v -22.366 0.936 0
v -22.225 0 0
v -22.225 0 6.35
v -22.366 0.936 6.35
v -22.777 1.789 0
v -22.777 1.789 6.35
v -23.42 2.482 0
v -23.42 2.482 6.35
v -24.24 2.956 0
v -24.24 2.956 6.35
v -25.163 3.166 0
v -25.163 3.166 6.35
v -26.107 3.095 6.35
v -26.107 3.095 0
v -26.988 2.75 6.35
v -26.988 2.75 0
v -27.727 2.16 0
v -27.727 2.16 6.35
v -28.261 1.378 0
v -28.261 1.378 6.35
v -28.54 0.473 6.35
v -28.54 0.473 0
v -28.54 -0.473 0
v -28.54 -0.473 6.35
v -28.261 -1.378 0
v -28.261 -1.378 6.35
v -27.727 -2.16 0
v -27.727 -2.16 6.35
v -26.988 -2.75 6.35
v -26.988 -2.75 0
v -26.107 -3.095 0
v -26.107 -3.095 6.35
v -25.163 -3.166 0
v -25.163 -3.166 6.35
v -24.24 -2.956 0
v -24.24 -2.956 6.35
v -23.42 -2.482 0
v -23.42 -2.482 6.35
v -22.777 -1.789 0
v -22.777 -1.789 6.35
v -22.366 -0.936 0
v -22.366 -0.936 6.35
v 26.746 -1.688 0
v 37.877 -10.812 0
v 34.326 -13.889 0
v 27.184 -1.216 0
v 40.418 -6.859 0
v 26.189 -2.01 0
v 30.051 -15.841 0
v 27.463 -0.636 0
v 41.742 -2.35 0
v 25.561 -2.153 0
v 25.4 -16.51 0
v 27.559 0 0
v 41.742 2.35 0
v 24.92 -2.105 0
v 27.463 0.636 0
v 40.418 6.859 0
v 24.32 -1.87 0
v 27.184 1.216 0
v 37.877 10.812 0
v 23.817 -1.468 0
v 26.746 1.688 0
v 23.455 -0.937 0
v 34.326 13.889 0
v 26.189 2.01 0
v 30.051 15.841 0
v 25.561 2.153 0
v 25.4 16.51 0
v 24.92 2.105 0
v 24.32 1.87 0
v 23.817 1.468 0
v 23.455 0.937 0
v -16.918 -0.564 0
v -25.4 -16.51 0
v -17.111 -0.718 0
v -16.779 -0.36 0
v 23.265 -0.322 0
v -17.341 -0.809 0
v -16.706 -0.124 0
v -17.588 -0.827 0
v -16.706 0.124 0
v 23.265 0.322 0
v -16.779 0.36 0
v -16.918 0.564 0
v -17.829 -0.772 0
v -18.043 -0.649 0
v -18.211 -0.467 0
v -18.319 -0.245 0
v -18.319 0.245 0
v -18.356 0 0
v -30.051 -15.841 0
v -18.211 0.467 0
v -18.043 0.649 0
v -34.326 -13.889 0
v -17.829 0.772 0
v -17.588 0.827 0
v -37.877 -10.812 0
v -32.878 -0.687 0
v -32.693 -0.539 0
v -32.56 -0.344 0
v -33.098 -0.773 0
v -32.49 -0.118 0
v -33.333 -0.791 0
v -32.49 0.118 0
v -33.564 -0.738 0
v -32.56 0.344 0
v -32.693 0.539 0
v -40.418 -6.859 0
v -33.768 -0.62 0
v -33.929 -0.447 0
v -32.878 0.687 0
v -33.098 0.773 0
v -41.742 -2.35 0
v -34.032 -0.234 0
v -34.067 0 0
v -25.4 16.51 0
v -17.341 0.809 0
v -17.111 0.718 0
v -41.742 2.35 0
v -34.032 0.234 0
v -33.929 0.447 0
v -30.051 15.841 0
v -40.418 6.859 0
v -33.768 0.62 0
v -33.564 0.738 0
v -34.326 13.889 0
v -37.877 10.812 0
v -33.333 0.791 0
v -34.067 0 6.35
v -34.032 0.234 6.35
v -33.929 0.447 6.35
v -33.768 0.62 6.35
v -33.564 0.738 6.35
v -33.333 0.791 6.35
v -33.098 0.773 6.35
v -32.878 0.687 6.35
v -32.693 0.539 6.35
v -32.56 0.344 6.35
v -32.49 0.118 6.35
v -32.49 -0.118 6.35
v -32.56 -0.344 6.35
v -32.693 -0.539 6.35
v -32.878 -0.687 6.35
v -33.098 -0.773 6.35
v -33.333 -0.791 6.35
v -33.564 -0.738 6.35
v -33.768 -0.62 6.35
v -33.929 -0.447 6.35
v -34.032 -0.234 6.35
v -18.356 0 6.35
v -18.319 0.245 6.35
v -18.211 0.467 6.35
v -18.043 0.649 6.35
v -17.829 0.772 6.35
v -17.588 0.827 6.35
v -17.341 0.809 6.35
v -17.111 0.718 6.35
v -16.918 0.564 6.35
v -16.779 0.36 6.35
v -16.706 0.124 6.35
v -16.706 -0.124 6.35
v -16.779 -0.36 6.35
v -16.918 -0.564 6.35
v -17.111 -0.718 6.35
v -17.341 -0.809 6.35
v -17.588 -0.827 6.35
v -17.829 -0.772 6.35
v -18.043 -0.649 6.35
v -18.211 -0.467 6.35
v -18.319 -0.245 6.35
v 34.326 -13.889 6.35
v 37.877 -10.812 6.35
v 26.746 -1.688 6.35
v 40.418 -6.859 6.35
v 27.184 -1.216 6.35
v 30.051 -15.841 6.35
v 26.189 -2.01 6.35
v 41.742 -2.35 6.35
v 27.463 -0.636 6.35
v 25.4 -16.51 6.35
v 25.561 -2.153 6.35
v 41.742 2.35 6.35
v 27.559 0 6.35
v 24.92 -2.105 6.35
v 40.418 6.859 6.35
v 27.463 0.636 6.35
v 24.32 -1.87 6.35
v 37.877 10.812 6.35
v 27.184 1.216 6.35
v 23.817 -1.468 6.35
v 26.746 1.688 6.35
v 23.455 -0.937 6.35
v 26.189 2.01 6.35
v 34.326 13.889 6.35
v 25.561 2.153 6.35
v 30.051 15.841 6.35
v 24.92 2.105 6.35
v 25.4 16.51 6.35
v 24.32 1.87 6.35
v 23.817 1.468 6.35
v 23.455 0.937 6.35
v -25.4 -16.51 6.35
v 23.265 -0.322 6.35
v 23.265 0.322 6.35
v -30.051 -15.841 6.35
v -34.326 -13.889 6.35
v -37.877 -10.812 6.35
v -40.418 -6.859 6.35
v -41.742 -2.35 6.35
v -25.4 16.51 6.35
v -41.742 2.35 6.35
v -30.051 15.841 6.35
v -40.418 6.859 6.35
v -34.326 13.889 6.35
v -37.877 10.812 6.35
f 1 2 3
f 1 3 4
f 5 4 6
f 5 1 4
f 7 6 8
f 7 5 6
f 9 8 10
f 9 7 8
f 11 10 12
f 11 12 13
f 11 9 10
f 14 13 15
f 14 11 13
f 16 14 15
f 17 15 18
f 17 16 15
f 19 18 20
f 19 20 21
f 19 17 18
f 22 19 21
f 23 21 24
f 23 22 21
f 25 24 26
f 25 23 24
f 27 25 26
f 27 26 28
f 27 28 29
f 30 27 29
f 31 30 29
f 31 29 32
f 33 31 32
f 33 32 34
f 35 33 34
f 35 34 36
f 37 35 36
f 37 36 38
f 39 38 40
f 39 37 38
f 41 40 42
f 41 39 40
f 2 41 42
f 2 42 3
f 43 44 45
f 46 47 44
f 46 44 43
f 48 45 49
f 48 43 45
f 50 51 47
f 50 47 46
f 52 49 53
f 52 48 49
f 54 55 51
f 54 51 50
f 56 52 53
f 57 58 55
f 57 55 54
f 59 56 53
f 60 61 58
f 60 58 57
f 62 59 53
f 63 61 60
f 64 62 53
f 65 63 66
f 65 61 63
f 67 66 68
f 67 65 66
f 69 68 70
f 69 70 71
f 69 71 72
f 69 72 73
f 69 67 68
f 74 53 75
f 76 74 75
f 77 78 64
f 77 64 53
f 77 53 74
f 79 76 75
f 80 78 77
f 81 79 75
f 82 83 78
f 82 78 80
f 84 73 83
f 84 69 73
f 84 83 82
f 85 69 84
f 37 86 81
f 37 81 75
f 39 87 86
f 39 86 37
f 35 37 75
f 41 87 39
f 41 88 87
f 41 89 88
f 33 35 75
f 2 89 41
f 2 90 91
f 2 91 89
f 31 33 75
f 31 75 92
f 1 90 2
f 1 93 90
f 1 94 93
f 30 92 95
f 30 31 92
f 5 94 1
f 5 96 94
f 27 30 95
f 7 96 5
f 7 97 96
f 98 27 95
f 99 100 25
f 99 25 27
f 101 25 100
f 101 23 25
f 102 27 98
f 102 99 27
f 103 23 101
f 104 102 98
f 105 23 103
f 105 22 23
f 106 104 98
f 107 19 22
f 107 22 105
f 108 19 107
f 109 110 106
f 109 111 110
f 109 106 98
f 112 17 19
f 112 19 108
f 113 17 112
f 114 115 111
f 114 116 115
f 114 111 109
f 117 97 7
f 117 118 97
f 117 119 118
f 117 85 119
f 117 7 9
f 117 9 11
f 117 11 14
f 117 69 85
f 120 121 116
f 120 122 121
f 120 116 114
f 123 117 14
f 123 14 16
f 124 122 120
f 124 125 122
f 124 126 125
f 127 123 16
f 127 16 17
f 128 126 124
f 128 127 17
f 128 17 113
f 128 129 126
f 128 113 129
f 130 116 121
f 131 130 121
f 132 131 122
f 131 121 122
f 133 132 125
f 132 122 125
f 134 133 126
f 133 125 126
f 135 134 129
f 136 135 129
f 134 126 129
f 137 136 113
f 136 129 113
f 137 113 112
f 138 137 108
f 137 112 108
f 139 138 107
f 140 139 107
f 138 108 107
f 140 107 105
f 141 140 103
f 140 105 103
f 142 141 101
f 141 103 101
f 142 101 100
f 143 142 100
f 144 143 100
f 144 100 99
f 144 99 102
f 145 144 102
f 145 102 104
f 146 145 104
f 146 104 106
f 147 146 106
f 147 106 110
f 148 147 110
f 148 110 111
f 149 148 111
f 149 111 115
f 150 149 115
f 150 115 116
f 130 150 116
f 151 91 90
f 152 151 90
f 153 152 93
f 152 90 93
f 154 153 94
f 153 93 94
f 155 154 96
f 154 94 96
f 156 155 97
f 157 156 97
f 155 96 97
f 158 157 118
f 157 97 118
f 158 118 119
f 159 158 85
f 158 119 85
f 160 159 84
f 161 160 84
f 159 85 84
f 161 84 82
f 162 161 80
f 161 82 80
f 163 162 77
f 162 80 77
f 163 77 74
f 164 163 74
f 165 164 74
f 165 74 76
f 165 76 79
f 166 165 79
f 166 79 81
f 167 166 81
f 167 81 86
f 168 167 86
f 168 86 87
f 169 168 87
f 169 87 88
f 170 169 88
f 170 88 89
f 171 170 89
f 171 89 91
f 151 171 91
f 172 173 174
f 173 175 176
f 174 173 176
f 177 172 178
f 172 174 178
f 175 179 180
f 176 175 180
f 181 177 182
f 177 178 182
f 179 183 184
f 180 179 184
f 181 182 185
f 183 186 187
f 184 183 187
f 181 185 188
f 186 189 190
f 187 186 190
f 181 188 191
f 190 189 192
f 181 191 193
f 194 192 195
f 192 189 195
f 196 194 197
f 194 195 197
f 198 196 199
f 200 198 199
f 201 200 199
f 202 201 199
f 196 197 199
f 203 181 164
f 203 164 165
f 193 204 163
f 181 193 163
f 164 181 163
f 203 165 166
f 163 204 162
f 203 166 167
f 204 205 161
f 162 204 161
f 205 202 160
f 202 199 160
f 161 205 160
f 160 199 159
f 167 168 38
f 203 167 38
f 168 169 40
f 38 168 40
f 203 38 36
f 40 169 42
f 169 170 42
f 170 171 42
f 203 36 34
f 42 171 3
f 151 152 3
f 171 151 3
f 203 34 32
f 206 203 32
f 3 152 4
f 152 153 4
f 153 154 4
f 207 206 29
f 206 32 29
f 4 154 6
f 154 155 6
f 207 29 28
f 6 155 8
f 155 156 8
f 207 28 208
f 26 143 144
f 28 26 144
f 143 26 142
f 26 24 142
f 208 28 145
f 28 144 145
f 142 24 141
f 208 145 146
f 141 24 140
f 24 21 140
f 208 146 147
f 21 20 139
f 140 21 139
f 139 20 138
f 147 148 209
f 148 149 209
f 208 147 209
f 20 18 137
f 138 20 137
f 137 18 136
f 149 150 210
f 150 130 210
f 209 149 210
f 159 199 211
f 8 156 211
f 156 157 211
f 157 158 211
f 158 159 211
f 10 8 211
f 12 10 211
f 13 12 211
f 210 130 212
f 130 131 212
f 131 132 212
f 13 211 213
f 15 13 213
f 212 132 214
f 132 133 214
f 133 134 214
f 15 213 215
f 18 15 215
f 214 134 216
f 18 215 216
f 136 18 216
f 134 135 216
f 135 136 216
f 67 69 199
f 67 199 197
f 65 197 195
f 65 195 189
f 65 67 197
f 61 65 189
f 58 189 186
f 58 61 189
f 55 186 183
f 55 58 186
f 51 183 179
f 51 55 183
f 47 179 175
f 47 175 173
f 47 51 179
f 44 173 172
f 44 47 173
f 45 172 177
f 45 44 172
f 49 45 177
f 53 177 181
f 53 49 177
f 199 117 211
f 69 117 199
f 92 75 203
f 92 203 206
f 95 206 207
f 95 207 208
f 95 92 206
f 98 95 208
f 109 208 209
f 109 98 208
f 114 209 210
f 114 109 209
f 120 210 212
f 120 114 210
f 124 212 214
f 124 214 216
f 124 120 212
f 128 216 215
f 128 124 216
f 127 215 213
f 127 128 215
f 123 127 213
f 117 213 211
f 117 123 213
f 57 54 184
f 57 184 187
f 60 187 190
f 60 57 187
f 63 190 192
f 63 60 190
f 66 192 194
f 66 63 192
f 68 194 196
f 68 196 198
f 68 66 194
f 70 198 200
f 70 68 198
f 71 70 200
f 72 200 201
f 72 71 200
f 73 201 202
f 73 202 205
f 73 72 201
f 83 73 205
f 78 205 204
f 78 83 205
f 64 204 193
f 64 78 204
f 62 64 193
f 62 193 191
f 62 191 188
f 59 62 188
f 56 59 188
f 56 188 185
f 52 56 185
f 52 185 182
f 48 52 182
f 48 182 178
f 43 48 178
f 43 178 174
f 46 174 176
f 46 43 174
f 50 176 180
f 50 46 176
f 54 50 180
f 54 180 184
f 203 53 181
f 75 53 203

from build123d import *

# Parameters (mm, degrees)
SKETCH1_R           = 2.159
SKETCH1_R_2         = 3.175
BOSS_EXTRUDE1_DEPTH = 6.35
SKETCH2_R           = 7.759647624
SKETCH2_R_2         = 3.81
BOSS_EXTRUDE2_DEPTH = 1.27
SKETCH3_R           = 0.829532788
SKETCH3_R_2         = 0.792789718
CUT_EXTRUDE1_DEPTH  = 17.272


with BuildPart() as part:
    # Sketch1 → Boss-Extrude1 (new body)
    with BuildSketch(Plane.XY):
        with BuildLine():
            Line((-25.4, 16.51), (25.4, 16.51))
            ThreePointArc((25.4, 16.51), (41.91, 0), (25.4, -16.51))
            Line((25.4, -16.51), (-25.4, -16.51))
            ThreePointArc((-25.4, -16.51), (-41.91, 0), (-25.4, 16.51))
        make_face()
        with Locations((25.4, 0)):
            Circle(SKETCH1_R, mode=Mode.SUBTRACT)
        with Locations((-25.4, 0)):
            Circle(SKETCH1_R_2, mode=Mode.SUBTRACT)
    extrude(amount=BOSS_EXTRUDE1_DEPTH)

    # Sketch2 → Boss-Extrude2 (add)
    with BuildSketch(Plane.XY.offset(6.35)):
        with Locations((25.4, 0)):
            Circle(SKETCH2_R)
        with Locations((25.4, 0)):
            Circle(SKETCH2_R_2, mode=Mode.SUBTRACT)
    extrude(amount=-BOSS_EXTRUDE2_DEPTH)

    # Sketch3 → Cut-Extrude1 (cut)
    with BuildSketch(Plane(origin=(0, 0, 0), x_dir=(-1, 0, 0), z_dir=(0, 0, -1))):
        with Locations((17.526, 0)):
            Circle(SKETCH3_R)
        with Locations((33.274, 0)):
            Circle(SKETCH3_R_2)
    extrude(amount=-CUT_EXTRUDE1_DEPTH, mode=Mode.SUBTRACT)


solid = part.part
